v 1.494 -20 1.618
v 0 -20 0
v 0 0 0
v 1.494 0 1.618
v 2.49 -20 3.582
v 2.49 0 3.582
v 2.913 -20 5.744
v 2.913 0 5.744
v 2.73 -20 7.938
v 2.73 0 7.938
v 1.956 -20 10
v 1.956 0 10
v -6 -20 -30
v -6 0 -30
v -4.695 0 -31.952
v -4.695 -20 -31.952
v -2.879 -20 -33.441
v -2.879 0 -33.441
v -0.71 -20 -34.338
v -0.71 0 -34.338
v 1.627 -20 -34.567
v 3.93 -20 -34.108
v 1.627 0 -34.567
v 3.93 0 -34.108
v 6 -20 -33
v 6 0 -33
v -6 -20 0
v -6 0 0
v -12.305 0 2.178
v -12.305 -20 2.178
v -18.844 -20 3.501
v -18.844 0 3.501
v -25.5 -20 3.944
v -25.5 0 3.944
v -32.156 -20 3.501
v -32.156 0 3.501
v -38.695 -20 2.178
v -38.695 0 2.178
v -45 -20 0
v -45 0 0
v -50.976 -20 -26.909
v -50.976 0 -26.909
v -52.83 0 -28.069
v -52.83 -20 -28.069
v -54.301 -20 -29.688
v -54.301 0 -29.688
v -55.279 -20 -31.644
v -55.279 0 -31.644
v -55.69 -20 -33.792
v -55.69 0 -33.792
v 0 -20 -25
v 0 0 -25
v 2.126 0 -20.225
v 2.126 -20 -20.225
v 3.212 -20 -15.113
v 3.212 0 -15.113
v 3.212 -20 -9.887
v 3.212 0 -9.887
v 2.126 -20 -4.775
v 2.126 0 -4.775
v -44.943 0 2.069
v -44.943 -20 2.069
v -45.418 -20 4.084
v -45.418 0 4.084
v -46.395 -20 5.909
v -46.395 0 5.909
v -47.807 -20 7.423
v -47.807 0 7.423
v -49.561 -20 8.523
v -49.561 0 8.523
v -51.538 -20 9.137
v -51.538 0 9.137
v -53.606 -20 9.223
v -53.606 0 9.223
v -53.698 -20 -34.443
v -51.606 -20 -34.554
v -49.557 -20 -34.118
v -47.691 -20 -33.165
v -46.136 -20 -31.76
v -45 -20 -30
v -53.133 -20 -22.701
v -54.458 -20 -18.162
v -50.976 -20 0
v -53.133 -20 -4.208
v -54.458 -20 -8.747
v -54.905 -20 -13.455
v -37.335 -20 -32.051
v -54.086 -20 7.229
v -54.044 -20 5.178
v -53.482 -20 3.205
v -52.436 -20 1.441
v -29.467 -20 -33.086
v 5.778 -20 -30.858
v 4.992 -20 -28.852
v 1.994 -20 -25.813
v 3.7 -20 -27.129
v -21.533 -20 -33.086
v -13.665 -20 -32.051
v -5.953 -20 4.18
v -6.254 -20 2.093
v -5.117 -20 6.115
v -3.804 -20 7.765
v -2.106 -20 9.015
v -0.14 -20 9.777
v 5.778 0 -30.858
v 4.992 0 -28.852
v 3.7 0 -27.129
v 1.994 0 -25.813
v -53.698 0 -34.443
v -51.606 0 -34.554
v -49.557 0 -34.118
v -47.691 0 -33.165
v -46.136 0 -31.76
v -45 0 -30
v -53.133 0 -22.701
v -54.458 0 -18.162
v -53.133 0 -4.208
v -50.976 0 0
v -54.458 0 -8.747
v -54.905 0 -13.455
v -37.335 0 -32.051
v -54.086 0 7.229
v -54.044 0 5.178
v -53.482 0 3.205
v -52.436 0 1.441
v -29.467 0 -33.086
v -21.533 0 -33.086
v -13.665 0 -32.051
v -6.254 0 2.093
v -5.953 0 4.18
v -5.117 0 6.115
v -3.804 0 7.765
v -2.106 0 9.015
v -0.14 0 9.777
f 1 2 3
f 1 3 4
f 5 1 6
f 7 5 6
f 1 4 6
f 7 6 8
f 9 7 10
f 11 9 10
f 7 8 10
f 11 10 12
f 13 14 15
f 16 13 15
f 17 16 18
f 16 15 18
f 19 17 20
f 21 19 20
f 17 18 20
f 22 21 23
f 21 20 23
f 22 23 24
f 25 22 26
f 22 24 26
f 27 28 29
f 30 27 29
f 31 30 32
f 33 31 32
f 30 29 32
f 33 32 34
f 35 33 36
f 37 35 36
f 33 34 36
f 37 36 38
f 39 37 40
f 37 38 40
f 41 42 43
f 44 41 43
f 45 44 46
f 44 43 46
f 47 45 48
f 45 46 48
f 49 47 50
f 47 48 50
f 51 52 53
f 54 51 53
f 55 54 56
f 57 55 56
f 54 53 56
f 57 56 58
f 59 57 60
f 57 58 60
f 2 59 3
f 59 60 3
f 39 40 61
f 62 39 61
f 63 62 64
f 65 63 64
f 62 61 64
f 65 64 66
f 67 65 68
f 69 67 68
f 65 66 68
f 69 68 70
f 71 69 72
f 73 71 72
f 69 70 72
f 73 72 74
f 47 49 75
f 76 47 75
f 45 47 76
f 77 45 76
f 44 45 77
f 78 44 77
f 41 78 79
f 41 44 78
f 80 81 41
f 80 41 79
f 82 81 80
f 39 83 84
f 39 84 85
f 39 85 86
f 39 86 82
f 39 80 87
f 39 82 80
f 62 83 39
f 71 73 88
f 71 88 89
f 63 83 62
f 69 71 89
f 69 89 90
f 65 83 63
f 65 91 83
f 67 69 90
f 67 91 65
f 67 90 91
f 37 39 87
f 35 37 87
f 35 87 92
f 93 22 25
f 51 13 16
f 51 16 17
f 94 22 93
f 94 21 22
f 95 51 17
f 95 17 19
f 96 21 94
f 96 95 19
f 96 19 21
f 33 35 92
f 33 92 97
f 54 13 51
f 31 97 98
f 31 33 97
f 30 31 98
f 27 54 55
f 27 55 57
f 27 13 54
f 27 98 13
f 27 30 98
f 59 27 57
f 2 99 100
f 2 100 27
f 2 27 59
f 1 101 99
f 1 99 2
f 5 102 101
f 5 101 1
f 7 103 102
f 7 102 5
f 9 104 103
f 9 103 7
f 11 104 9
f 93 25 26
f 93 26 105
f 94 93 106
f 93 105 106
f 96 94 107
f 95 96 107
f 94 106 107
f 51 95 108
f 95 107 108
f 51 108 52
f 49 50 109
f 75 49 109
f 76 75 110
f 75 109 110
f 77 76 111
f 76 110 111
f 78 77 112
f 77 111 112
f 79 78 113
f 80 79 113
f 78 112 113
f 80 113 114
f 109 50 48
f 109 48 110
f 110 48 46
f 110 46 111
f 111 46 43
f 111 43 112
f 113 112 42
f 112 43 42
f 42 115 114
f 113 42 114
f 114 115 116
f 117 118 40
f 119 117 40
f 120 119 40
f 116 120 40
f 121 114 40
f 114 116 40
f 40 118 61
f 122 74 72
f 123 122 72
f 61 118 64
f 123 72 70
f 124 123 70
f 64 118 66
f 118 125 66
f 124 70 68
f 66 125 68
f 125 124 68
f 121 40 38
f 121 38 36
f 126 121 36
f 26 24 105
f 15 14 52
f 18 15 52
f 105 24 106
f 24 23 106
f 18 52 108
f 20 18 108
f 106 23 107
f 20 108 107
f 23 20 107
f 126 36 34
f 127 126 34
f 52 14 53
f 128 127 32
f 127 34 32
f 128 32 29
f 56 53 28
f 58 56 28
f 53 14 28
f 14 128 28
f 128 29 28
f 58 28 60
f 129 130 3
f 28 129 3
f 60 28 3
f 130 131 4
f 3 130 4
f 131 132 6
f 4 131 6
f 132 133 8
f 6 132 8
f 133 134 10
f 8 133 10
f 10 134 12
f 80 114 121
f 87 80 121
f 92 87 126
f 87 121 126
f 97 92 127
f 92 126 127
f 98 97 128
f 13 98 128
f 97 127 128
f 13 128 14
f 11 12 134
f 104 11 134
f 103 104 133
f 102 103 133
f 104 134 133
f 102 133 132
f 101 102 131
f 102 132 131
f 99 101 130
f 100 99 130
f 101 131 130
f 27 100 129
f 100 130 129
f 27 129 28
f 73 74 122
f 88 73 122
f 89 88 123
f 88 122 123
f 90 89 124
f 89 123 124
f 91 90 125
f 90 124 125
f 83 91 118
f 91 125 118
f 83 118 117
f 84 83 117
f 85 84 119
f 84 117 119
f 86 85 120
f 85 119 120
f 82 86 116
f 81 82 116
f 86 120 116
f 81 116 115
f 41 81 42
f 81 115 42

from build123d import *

# Parameters (mm, degrees)
F1_DEPTH = 20


with BuildPart() as f1:
    # F0 (on Front) → F1 (new body)
    with BuildSketch(Plane.XZ):
        with BuildLine():
            ThreePointArc((6, -33), (4.404002, -27.946999), (0, -25))
            ThreePointArc((0, -25), (3.349365, -12.5), (0, 0))
            ThreePointArc((0, 0), (2.776172, 4.64825), (1.956342, 10))
            ThreePointArc((1.956342, 10), (-4.515013, 6.983663), (-6, 0))
            ThreePointArc((-6, 0), (-25.5, 3.94398), (-45, 0))
            ThreePointArc((-45, 0), (-47.052036, 6.711726), (-53.605872, 9.222772))
            ThreePointArc((-53.605872, 9.222772), (-53.826207, 4.173647), (-50.976141, 0))
            ThreePointArc((-50.976141, 0), (-54.905427, -13.454553), (-50.976141, -26.909107))
            ThreePointArc((-50.976141, -26.909107), (-54.301232, -29.687561), (-55.689886, -33.792153))
            ThreePointArc((-55.689886, -33.792153), (-49.556723, -34.118029), (-45, -30))
            ThreePointArc((-45, -30), (-25.5, -33.215544), (-6, -30))
            ThreePointArc((-6, -30), (-0.709551, -34.338204), (6, -33))
        make_face()
    extrude(amount=F1_DEPTH)


solid = f1.part
